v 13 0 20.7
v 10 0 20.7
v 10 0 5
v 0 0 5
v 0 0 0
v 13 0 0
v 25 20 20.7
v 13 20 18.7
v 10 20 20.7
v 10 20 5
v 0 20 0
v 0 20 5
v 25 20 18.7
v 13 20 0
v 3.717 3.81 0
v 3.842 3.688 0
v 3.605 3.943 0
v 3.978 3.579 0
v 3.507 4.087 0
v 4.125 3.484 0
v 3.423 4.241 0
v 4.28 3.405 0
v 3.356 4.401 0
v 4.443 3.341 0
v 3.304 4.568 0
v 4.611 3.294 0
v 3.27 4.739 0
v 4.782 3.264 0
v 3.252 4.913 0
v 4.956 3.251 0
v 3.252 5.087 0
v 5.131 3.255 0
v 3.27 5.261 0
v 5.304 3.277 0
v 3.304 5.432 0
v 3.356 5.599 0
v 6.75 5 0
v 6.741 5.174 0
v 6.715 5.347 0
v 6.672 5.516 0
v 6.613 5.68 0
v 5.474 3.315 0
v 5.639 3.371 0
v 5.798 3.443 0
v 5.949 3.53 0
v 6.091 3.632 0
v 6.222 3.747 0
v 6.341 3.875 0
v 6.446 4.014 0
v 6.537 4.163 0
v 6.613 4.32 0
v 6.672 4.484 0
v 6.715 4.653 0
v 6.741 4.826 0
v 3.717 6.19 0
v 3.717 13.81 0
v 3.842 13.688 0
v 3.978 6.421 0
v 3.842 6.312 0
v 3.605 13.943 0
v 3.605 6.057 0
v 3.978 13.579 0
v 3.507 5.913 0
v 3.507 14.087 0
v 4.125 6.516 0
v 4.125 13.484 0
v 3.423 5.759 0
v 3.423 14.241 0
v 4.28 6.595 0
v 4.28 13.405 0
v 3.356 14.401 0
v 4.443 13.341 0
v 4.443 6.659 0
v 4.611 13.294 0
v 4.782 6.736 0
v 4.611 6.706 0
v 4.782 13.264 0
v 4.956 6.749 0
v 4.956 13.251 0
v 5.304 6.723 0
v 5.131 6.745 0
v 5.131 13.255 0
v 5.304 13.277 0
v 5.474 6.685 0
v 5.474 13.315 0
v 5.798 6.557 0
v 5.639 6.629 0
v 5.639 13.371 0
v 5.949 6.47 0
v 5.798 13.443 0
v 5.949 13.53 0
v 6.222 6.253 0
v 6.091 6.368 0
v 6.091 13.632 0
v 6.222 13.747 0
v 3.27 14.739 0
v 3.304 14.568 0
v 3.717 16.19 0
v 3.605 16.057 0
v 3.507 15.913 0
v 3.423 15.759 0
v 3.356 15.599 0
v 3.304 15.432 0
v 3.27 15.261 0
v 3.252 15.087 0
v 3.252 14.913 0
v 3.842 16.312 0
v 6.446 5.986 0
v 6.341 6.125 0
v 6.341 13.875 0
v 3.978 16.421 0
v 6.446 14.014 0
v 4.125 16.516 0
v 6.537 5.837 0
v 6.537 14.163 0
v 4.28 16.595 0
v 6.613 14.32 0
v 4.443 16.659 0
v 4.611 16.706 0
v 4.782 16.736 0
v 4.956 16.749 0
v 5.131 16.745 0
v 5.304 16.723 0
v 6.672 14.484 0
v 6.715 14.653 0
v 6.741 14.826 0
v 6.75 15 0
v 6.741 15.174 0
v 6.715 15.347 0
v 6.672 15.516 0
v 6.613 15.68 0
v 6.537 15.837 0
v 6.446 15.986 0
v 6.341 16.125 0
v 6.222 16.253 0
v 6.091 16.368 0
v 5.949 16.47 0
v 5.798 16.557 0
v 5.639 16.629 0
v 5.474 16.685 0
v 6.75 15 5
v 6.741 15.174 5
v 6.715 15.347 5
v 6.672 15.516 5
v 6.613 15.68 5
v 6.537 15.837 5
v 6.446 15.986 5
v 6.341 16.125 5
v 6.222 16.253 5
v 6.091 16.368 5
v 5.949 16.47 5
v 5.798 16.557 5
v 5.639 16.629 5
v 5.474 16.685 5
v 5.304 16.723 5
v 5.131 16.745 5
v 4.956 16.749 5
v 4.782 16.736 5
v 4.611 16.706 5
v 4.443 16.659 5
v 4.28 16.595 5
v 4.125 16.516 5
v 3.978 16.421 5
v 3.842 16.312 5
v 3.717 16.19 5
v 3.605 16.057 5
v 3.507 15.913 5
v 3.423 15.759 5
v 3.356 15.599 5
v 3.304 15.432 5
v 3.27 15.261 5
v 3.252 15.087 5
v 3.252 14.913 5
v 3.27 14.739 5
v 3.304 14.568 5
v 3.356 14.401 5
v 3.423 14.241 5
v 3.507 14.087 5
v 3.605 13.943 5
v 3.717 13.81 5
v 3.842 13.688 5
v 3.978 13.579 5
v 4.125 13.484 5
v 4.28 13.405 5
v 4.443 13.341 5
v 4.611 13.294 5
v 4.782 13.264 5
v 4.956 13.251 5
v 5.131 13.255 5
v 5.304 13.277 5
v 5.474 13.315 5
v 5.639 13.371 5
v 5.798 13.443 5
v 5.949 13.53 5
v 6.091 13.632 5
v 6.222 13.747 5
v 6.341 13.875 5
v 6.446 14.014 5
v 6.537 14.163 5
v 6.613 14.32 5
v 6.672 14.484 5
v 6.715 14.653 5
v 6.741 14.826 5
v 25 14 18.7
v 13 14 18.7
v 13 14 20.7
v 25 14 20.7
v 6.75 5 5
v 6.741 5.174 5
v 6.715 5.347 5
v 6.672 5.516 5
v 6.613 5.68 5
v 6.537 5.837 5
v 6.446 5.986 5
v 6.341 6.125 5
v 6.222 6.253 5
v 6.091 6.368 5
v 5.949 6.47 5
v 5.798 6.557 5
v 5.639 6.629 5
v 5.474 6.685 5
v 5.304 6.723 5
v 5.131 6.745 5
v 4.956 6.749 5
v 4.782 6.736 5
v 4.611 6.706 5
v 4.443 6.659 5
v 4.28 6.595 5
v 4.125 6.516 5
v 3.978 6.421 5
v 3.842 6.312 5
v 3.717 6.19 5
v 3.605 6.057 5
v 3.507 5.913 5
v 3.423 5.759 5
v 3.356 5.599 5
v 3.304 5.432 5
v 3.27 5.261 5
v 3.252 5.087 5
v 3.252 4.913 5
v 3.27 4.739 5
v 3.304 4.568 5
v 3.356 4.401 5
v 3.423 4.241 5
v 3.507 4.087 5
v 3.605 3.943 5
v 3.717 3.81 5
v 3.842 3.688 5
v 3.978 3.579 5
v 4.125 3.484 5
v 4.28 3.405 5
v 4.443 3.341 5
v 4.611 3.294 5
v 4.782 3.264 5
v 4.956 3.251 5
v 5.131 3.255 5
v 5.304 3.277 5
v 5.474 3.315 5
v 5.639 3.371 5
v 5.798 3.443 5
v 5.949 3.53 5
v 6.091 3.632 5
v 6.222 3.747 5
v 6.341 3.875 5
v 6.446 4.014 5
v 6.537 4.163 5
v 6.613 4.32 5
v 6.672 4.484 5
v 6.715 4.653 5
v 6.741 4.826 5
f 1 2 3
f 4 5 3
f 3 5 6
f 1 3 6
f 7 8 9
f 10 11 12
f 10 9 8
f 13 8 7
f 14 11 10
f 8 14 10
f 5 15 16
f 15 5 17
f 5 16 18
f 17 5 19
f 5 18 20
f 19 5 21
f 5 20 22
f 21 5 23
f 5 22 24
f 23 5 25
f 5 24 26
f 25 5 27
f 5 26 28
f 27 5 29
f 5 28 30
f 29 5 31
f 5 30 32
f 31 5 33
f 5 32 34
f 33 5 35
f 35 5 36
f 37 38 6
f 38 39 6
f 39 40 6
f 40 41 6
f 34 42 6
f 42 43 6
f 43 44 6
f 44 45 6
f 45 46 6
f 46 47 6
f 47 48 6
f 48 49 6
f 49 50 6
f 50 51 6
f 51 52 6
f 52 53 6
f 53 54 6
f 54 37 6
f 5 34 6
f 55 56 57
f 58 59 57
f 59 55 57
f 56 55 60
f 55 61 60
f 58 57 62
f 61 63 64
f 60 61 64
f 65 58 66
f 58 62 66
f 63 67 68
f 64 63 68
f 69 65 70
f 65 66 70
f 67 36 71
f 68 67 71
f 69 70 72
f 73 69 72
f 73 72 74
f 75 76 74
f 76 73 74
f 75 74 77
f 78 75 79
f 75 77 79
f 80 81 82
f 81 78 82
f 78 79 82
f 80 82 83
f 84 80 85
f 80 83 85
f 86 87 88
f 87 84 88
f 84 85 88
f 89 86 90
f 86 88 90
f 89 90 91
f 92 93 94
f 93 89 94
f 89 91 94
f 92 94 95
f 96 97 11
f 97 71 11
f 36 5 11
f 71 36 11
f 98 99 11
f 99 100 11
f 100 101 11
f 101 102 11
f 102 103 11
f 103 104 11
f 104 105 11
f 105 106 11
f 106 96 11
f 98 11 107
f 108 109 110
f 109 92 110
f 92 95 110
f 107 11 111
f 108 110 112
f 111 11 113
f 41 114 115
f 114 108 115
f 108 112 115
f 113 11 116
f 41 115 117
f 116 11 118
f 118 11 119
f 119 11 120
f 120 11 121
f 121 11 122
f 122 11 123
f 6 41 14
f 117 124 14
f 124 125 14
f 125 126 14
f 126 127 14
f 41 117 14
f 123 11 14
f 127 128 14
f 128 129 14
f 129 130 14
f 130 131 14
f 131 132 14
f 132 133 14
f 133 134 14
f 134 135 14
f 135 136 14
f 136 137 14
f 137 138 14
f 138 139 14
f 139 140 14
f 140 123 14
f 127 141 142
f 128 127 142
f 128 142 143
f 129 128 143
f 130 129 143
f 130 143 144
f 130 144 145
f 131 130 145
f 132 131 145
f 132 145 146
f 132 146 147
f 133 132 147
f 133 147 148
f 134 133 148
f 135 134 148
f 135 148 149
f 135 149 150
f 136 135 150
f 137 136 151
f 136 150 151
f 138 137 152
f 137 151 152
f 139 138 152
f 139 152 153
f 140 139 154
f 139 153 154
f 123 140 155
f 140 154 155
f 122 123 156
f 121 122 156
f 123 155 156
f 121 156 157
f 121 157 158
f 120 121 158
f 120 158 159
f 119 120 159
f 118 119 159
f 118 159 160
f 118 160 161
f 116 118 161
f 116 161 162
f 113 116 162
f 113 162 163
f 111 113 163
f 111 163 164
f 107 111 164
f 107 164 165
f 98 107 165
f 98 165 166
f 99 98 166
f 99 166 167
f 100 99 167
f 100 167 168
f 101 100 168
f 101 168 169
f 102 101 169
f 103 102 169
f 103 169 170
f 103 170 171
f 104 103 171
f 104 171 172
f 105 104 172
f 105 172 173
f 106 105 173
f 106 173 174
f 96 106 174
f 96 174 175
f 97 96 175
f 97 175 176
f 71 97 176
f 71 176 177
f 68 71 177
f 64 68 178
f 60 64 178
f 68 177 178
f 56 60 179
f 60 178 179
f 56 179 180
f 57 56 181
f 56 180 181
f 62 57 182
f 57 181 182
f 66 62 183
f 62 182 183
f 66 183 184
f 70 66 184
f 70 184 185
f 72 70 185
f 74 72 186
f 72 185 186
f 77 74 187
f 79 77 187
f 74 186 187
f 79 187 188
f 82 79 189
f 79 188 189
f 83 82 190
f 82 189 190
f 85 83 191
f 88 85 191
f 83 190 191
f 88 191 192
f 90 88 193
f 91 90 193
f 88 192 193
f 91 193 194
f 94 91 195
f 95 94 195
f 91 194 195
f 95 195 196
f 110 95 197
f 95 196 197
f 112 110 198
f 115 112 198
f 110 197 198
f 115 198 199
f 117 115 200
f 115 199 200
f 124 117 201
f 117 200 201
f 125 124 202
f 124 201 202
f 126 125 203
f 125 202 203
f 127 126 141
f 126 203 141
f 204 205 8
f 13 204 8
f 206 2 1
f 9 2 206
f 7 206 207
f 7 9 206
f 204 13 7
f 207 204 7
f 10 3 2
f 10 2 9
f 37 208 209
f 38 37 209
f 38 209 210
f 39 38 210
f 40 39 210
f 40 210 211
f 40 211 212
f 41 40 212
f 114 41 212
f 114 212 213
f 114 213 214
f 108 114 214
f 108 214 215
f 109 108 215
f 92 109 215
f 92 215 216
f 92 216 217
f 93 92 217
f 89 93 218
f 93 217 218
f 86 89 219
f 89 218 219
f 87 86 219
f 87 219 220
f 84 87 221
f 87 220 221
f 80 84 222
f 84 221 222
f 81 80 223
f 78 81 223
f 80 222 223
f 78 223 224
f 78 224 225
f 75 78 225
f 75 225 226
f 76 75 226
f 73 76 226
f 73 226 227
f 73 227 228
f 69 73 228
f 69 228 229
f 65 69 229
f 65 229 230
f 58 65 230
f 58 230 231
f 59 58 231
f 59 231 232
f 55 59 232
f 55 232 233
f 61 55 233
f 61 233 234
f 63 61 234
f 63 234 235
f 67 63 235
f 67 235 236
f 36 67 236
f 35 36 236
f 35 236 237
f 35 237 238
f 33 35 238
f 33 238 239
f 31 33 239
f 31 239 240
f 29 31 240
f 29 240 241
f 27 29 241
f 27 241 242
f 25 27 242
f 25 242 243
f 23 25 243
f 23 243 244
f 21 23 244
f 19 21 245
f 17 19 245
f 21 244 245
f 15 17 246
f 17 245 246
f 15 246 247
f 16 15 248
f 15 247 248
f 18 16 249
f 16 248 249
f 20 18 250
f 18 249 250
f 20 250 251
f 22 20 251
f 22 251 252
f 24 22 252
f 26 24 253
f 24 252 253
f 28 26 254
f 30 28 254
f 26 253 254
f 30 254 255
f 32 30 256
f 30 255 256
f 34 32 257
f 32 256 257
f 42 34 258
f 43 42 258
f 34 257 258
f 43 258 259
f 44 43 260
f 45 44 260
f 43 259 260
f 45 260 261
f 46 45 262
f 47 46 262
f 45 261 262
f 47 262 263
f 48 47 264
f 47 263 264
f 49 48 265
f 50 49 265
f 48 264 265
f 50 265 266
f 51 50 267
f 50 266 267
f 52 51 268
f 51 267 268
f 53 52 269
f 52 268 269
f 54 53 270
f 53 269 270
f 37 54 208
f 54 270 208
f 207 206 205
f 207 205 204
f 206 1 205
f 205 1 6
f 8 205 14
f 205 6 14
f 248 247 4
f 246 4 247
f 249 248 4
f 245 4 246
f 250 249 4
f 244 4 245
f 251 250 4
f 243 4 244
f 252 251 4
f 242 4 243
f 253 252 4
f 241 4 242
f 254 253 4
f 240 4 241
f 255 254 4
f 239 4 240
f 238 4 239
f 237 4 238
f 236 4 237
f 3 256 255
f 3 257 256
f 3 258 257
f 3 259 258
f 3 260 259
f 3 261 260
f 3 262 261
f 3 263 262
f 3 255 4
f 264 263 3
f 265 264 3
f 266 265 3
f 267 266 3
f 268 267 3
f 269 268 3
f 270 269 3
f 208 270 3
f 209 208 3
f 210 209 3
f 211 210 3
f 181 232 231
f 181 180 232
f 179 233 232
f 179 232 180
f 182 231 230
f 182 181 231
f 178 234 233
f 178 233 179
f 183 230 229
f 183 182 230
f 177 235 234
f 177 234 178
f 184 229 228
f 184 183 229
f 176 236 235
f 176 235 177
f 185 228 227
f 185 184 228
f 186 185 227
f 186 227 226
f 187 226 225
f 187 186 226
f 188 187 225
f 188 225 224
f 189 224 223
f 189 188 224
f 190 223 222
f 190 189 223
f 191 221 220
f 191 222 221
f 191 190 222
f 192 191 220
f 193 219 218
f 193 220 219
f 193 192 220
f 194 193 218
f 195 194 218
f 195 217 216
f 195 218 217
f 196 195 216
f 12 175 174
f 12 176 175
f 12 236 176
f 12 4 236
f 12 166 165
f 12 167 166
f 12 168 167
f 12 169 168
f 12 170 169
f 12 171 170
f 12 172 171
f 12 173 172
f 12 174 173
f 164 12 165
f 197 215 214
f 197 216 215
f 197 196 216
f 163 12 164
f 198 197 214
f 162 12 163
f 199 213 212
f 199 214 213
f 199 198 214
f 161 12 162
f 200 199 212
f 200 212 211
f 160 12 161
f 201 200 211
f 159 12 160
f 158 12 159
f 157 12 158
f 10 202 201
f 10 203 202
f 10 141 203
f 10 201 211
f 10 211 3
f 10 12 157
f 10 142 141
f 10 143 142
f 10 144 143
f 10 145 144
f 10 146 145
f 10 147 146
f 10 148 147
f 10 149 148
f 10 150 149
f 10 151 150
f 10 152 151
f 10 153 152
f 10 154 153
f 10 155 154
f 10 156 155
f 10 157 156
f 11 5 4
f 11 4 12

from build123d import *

# Parameters (mm, degrees)
SKETCH_1_W          = 13
SKETCH_1_H          = 20
EXTRUDE_1_DEPTH     = 5
SKETCH_3_W          = 3
SKETCH_3_H          = 20
EXTRUDE_2_DEPTH     = 15.7
SKETCH_4_W          = 2
SKETCH_4_H          = 20
EXTRUDE_3_DEPTH     = 15
SKETCH_5_W          = 12
SKETCH_5_H          = 14
CUT_EXTRUDE_1_DEPTH = 21.7
SKETCH_6_R          = 1.75
CUT_EXTRUDE_2_DEPTH = 6


with BuildPart() as part:
    # 草图1 → 凸台-拉伸1 (new body)
    with BuildSketch(Plane.XY):
        with Locations((6.5, 10)):
            Rectangle(SKETCH_1_W, SKETCH_1_H)
    extrude(amount=EXTRUDE_1_DEPTH)

    # 草图3 → 凸台-拉伸2 (add)
    with BuildSketch(Plane.XY.offset(5)):
        with Locations((11.5, 10)):
            Rectangle(SKETCH_3_W, SKETCH_3_H)
    extrude(amount=EXTRUDE_2_DEPTH)

    # 草图4 → 凸台-拉伸3 (add)
    with BuildSketch(Plane.ZY.offset(-10)):
        with Locations((19.7, 10)):
            Rectangle(SKETCH_4_W, SKETCH_4_H)
    extrude(amount=-EXTRUDE_3_DEPTH)

    # 草图5 → 切除-拉伸1 (cut, through all)
    with BuildSketch(Plane.XY.offset(20.7)):
        with Locations((19, 7)):
            Rectangle(SKETCH_5_W, SKETCH_5_H)
    extrude(amount=-CUT_EXTRUDE_1_DEPTH, mode=Mode.SUBTRACT)

    # 草图6 → 切除-拉伸2 (cut, through all)
    with BuildSketch(Plane.XY.offset(5)):
        with Locations((5, 15)):
            Circle(SKETCH_6_R)
        with Locations((5, 5)):
            Circle(SKETCH_6_R)
    extrude(amount=-CUT_EXTRUDE_2_DEPTH, mode=Mode.SUBTRACT)


solid = part.part
